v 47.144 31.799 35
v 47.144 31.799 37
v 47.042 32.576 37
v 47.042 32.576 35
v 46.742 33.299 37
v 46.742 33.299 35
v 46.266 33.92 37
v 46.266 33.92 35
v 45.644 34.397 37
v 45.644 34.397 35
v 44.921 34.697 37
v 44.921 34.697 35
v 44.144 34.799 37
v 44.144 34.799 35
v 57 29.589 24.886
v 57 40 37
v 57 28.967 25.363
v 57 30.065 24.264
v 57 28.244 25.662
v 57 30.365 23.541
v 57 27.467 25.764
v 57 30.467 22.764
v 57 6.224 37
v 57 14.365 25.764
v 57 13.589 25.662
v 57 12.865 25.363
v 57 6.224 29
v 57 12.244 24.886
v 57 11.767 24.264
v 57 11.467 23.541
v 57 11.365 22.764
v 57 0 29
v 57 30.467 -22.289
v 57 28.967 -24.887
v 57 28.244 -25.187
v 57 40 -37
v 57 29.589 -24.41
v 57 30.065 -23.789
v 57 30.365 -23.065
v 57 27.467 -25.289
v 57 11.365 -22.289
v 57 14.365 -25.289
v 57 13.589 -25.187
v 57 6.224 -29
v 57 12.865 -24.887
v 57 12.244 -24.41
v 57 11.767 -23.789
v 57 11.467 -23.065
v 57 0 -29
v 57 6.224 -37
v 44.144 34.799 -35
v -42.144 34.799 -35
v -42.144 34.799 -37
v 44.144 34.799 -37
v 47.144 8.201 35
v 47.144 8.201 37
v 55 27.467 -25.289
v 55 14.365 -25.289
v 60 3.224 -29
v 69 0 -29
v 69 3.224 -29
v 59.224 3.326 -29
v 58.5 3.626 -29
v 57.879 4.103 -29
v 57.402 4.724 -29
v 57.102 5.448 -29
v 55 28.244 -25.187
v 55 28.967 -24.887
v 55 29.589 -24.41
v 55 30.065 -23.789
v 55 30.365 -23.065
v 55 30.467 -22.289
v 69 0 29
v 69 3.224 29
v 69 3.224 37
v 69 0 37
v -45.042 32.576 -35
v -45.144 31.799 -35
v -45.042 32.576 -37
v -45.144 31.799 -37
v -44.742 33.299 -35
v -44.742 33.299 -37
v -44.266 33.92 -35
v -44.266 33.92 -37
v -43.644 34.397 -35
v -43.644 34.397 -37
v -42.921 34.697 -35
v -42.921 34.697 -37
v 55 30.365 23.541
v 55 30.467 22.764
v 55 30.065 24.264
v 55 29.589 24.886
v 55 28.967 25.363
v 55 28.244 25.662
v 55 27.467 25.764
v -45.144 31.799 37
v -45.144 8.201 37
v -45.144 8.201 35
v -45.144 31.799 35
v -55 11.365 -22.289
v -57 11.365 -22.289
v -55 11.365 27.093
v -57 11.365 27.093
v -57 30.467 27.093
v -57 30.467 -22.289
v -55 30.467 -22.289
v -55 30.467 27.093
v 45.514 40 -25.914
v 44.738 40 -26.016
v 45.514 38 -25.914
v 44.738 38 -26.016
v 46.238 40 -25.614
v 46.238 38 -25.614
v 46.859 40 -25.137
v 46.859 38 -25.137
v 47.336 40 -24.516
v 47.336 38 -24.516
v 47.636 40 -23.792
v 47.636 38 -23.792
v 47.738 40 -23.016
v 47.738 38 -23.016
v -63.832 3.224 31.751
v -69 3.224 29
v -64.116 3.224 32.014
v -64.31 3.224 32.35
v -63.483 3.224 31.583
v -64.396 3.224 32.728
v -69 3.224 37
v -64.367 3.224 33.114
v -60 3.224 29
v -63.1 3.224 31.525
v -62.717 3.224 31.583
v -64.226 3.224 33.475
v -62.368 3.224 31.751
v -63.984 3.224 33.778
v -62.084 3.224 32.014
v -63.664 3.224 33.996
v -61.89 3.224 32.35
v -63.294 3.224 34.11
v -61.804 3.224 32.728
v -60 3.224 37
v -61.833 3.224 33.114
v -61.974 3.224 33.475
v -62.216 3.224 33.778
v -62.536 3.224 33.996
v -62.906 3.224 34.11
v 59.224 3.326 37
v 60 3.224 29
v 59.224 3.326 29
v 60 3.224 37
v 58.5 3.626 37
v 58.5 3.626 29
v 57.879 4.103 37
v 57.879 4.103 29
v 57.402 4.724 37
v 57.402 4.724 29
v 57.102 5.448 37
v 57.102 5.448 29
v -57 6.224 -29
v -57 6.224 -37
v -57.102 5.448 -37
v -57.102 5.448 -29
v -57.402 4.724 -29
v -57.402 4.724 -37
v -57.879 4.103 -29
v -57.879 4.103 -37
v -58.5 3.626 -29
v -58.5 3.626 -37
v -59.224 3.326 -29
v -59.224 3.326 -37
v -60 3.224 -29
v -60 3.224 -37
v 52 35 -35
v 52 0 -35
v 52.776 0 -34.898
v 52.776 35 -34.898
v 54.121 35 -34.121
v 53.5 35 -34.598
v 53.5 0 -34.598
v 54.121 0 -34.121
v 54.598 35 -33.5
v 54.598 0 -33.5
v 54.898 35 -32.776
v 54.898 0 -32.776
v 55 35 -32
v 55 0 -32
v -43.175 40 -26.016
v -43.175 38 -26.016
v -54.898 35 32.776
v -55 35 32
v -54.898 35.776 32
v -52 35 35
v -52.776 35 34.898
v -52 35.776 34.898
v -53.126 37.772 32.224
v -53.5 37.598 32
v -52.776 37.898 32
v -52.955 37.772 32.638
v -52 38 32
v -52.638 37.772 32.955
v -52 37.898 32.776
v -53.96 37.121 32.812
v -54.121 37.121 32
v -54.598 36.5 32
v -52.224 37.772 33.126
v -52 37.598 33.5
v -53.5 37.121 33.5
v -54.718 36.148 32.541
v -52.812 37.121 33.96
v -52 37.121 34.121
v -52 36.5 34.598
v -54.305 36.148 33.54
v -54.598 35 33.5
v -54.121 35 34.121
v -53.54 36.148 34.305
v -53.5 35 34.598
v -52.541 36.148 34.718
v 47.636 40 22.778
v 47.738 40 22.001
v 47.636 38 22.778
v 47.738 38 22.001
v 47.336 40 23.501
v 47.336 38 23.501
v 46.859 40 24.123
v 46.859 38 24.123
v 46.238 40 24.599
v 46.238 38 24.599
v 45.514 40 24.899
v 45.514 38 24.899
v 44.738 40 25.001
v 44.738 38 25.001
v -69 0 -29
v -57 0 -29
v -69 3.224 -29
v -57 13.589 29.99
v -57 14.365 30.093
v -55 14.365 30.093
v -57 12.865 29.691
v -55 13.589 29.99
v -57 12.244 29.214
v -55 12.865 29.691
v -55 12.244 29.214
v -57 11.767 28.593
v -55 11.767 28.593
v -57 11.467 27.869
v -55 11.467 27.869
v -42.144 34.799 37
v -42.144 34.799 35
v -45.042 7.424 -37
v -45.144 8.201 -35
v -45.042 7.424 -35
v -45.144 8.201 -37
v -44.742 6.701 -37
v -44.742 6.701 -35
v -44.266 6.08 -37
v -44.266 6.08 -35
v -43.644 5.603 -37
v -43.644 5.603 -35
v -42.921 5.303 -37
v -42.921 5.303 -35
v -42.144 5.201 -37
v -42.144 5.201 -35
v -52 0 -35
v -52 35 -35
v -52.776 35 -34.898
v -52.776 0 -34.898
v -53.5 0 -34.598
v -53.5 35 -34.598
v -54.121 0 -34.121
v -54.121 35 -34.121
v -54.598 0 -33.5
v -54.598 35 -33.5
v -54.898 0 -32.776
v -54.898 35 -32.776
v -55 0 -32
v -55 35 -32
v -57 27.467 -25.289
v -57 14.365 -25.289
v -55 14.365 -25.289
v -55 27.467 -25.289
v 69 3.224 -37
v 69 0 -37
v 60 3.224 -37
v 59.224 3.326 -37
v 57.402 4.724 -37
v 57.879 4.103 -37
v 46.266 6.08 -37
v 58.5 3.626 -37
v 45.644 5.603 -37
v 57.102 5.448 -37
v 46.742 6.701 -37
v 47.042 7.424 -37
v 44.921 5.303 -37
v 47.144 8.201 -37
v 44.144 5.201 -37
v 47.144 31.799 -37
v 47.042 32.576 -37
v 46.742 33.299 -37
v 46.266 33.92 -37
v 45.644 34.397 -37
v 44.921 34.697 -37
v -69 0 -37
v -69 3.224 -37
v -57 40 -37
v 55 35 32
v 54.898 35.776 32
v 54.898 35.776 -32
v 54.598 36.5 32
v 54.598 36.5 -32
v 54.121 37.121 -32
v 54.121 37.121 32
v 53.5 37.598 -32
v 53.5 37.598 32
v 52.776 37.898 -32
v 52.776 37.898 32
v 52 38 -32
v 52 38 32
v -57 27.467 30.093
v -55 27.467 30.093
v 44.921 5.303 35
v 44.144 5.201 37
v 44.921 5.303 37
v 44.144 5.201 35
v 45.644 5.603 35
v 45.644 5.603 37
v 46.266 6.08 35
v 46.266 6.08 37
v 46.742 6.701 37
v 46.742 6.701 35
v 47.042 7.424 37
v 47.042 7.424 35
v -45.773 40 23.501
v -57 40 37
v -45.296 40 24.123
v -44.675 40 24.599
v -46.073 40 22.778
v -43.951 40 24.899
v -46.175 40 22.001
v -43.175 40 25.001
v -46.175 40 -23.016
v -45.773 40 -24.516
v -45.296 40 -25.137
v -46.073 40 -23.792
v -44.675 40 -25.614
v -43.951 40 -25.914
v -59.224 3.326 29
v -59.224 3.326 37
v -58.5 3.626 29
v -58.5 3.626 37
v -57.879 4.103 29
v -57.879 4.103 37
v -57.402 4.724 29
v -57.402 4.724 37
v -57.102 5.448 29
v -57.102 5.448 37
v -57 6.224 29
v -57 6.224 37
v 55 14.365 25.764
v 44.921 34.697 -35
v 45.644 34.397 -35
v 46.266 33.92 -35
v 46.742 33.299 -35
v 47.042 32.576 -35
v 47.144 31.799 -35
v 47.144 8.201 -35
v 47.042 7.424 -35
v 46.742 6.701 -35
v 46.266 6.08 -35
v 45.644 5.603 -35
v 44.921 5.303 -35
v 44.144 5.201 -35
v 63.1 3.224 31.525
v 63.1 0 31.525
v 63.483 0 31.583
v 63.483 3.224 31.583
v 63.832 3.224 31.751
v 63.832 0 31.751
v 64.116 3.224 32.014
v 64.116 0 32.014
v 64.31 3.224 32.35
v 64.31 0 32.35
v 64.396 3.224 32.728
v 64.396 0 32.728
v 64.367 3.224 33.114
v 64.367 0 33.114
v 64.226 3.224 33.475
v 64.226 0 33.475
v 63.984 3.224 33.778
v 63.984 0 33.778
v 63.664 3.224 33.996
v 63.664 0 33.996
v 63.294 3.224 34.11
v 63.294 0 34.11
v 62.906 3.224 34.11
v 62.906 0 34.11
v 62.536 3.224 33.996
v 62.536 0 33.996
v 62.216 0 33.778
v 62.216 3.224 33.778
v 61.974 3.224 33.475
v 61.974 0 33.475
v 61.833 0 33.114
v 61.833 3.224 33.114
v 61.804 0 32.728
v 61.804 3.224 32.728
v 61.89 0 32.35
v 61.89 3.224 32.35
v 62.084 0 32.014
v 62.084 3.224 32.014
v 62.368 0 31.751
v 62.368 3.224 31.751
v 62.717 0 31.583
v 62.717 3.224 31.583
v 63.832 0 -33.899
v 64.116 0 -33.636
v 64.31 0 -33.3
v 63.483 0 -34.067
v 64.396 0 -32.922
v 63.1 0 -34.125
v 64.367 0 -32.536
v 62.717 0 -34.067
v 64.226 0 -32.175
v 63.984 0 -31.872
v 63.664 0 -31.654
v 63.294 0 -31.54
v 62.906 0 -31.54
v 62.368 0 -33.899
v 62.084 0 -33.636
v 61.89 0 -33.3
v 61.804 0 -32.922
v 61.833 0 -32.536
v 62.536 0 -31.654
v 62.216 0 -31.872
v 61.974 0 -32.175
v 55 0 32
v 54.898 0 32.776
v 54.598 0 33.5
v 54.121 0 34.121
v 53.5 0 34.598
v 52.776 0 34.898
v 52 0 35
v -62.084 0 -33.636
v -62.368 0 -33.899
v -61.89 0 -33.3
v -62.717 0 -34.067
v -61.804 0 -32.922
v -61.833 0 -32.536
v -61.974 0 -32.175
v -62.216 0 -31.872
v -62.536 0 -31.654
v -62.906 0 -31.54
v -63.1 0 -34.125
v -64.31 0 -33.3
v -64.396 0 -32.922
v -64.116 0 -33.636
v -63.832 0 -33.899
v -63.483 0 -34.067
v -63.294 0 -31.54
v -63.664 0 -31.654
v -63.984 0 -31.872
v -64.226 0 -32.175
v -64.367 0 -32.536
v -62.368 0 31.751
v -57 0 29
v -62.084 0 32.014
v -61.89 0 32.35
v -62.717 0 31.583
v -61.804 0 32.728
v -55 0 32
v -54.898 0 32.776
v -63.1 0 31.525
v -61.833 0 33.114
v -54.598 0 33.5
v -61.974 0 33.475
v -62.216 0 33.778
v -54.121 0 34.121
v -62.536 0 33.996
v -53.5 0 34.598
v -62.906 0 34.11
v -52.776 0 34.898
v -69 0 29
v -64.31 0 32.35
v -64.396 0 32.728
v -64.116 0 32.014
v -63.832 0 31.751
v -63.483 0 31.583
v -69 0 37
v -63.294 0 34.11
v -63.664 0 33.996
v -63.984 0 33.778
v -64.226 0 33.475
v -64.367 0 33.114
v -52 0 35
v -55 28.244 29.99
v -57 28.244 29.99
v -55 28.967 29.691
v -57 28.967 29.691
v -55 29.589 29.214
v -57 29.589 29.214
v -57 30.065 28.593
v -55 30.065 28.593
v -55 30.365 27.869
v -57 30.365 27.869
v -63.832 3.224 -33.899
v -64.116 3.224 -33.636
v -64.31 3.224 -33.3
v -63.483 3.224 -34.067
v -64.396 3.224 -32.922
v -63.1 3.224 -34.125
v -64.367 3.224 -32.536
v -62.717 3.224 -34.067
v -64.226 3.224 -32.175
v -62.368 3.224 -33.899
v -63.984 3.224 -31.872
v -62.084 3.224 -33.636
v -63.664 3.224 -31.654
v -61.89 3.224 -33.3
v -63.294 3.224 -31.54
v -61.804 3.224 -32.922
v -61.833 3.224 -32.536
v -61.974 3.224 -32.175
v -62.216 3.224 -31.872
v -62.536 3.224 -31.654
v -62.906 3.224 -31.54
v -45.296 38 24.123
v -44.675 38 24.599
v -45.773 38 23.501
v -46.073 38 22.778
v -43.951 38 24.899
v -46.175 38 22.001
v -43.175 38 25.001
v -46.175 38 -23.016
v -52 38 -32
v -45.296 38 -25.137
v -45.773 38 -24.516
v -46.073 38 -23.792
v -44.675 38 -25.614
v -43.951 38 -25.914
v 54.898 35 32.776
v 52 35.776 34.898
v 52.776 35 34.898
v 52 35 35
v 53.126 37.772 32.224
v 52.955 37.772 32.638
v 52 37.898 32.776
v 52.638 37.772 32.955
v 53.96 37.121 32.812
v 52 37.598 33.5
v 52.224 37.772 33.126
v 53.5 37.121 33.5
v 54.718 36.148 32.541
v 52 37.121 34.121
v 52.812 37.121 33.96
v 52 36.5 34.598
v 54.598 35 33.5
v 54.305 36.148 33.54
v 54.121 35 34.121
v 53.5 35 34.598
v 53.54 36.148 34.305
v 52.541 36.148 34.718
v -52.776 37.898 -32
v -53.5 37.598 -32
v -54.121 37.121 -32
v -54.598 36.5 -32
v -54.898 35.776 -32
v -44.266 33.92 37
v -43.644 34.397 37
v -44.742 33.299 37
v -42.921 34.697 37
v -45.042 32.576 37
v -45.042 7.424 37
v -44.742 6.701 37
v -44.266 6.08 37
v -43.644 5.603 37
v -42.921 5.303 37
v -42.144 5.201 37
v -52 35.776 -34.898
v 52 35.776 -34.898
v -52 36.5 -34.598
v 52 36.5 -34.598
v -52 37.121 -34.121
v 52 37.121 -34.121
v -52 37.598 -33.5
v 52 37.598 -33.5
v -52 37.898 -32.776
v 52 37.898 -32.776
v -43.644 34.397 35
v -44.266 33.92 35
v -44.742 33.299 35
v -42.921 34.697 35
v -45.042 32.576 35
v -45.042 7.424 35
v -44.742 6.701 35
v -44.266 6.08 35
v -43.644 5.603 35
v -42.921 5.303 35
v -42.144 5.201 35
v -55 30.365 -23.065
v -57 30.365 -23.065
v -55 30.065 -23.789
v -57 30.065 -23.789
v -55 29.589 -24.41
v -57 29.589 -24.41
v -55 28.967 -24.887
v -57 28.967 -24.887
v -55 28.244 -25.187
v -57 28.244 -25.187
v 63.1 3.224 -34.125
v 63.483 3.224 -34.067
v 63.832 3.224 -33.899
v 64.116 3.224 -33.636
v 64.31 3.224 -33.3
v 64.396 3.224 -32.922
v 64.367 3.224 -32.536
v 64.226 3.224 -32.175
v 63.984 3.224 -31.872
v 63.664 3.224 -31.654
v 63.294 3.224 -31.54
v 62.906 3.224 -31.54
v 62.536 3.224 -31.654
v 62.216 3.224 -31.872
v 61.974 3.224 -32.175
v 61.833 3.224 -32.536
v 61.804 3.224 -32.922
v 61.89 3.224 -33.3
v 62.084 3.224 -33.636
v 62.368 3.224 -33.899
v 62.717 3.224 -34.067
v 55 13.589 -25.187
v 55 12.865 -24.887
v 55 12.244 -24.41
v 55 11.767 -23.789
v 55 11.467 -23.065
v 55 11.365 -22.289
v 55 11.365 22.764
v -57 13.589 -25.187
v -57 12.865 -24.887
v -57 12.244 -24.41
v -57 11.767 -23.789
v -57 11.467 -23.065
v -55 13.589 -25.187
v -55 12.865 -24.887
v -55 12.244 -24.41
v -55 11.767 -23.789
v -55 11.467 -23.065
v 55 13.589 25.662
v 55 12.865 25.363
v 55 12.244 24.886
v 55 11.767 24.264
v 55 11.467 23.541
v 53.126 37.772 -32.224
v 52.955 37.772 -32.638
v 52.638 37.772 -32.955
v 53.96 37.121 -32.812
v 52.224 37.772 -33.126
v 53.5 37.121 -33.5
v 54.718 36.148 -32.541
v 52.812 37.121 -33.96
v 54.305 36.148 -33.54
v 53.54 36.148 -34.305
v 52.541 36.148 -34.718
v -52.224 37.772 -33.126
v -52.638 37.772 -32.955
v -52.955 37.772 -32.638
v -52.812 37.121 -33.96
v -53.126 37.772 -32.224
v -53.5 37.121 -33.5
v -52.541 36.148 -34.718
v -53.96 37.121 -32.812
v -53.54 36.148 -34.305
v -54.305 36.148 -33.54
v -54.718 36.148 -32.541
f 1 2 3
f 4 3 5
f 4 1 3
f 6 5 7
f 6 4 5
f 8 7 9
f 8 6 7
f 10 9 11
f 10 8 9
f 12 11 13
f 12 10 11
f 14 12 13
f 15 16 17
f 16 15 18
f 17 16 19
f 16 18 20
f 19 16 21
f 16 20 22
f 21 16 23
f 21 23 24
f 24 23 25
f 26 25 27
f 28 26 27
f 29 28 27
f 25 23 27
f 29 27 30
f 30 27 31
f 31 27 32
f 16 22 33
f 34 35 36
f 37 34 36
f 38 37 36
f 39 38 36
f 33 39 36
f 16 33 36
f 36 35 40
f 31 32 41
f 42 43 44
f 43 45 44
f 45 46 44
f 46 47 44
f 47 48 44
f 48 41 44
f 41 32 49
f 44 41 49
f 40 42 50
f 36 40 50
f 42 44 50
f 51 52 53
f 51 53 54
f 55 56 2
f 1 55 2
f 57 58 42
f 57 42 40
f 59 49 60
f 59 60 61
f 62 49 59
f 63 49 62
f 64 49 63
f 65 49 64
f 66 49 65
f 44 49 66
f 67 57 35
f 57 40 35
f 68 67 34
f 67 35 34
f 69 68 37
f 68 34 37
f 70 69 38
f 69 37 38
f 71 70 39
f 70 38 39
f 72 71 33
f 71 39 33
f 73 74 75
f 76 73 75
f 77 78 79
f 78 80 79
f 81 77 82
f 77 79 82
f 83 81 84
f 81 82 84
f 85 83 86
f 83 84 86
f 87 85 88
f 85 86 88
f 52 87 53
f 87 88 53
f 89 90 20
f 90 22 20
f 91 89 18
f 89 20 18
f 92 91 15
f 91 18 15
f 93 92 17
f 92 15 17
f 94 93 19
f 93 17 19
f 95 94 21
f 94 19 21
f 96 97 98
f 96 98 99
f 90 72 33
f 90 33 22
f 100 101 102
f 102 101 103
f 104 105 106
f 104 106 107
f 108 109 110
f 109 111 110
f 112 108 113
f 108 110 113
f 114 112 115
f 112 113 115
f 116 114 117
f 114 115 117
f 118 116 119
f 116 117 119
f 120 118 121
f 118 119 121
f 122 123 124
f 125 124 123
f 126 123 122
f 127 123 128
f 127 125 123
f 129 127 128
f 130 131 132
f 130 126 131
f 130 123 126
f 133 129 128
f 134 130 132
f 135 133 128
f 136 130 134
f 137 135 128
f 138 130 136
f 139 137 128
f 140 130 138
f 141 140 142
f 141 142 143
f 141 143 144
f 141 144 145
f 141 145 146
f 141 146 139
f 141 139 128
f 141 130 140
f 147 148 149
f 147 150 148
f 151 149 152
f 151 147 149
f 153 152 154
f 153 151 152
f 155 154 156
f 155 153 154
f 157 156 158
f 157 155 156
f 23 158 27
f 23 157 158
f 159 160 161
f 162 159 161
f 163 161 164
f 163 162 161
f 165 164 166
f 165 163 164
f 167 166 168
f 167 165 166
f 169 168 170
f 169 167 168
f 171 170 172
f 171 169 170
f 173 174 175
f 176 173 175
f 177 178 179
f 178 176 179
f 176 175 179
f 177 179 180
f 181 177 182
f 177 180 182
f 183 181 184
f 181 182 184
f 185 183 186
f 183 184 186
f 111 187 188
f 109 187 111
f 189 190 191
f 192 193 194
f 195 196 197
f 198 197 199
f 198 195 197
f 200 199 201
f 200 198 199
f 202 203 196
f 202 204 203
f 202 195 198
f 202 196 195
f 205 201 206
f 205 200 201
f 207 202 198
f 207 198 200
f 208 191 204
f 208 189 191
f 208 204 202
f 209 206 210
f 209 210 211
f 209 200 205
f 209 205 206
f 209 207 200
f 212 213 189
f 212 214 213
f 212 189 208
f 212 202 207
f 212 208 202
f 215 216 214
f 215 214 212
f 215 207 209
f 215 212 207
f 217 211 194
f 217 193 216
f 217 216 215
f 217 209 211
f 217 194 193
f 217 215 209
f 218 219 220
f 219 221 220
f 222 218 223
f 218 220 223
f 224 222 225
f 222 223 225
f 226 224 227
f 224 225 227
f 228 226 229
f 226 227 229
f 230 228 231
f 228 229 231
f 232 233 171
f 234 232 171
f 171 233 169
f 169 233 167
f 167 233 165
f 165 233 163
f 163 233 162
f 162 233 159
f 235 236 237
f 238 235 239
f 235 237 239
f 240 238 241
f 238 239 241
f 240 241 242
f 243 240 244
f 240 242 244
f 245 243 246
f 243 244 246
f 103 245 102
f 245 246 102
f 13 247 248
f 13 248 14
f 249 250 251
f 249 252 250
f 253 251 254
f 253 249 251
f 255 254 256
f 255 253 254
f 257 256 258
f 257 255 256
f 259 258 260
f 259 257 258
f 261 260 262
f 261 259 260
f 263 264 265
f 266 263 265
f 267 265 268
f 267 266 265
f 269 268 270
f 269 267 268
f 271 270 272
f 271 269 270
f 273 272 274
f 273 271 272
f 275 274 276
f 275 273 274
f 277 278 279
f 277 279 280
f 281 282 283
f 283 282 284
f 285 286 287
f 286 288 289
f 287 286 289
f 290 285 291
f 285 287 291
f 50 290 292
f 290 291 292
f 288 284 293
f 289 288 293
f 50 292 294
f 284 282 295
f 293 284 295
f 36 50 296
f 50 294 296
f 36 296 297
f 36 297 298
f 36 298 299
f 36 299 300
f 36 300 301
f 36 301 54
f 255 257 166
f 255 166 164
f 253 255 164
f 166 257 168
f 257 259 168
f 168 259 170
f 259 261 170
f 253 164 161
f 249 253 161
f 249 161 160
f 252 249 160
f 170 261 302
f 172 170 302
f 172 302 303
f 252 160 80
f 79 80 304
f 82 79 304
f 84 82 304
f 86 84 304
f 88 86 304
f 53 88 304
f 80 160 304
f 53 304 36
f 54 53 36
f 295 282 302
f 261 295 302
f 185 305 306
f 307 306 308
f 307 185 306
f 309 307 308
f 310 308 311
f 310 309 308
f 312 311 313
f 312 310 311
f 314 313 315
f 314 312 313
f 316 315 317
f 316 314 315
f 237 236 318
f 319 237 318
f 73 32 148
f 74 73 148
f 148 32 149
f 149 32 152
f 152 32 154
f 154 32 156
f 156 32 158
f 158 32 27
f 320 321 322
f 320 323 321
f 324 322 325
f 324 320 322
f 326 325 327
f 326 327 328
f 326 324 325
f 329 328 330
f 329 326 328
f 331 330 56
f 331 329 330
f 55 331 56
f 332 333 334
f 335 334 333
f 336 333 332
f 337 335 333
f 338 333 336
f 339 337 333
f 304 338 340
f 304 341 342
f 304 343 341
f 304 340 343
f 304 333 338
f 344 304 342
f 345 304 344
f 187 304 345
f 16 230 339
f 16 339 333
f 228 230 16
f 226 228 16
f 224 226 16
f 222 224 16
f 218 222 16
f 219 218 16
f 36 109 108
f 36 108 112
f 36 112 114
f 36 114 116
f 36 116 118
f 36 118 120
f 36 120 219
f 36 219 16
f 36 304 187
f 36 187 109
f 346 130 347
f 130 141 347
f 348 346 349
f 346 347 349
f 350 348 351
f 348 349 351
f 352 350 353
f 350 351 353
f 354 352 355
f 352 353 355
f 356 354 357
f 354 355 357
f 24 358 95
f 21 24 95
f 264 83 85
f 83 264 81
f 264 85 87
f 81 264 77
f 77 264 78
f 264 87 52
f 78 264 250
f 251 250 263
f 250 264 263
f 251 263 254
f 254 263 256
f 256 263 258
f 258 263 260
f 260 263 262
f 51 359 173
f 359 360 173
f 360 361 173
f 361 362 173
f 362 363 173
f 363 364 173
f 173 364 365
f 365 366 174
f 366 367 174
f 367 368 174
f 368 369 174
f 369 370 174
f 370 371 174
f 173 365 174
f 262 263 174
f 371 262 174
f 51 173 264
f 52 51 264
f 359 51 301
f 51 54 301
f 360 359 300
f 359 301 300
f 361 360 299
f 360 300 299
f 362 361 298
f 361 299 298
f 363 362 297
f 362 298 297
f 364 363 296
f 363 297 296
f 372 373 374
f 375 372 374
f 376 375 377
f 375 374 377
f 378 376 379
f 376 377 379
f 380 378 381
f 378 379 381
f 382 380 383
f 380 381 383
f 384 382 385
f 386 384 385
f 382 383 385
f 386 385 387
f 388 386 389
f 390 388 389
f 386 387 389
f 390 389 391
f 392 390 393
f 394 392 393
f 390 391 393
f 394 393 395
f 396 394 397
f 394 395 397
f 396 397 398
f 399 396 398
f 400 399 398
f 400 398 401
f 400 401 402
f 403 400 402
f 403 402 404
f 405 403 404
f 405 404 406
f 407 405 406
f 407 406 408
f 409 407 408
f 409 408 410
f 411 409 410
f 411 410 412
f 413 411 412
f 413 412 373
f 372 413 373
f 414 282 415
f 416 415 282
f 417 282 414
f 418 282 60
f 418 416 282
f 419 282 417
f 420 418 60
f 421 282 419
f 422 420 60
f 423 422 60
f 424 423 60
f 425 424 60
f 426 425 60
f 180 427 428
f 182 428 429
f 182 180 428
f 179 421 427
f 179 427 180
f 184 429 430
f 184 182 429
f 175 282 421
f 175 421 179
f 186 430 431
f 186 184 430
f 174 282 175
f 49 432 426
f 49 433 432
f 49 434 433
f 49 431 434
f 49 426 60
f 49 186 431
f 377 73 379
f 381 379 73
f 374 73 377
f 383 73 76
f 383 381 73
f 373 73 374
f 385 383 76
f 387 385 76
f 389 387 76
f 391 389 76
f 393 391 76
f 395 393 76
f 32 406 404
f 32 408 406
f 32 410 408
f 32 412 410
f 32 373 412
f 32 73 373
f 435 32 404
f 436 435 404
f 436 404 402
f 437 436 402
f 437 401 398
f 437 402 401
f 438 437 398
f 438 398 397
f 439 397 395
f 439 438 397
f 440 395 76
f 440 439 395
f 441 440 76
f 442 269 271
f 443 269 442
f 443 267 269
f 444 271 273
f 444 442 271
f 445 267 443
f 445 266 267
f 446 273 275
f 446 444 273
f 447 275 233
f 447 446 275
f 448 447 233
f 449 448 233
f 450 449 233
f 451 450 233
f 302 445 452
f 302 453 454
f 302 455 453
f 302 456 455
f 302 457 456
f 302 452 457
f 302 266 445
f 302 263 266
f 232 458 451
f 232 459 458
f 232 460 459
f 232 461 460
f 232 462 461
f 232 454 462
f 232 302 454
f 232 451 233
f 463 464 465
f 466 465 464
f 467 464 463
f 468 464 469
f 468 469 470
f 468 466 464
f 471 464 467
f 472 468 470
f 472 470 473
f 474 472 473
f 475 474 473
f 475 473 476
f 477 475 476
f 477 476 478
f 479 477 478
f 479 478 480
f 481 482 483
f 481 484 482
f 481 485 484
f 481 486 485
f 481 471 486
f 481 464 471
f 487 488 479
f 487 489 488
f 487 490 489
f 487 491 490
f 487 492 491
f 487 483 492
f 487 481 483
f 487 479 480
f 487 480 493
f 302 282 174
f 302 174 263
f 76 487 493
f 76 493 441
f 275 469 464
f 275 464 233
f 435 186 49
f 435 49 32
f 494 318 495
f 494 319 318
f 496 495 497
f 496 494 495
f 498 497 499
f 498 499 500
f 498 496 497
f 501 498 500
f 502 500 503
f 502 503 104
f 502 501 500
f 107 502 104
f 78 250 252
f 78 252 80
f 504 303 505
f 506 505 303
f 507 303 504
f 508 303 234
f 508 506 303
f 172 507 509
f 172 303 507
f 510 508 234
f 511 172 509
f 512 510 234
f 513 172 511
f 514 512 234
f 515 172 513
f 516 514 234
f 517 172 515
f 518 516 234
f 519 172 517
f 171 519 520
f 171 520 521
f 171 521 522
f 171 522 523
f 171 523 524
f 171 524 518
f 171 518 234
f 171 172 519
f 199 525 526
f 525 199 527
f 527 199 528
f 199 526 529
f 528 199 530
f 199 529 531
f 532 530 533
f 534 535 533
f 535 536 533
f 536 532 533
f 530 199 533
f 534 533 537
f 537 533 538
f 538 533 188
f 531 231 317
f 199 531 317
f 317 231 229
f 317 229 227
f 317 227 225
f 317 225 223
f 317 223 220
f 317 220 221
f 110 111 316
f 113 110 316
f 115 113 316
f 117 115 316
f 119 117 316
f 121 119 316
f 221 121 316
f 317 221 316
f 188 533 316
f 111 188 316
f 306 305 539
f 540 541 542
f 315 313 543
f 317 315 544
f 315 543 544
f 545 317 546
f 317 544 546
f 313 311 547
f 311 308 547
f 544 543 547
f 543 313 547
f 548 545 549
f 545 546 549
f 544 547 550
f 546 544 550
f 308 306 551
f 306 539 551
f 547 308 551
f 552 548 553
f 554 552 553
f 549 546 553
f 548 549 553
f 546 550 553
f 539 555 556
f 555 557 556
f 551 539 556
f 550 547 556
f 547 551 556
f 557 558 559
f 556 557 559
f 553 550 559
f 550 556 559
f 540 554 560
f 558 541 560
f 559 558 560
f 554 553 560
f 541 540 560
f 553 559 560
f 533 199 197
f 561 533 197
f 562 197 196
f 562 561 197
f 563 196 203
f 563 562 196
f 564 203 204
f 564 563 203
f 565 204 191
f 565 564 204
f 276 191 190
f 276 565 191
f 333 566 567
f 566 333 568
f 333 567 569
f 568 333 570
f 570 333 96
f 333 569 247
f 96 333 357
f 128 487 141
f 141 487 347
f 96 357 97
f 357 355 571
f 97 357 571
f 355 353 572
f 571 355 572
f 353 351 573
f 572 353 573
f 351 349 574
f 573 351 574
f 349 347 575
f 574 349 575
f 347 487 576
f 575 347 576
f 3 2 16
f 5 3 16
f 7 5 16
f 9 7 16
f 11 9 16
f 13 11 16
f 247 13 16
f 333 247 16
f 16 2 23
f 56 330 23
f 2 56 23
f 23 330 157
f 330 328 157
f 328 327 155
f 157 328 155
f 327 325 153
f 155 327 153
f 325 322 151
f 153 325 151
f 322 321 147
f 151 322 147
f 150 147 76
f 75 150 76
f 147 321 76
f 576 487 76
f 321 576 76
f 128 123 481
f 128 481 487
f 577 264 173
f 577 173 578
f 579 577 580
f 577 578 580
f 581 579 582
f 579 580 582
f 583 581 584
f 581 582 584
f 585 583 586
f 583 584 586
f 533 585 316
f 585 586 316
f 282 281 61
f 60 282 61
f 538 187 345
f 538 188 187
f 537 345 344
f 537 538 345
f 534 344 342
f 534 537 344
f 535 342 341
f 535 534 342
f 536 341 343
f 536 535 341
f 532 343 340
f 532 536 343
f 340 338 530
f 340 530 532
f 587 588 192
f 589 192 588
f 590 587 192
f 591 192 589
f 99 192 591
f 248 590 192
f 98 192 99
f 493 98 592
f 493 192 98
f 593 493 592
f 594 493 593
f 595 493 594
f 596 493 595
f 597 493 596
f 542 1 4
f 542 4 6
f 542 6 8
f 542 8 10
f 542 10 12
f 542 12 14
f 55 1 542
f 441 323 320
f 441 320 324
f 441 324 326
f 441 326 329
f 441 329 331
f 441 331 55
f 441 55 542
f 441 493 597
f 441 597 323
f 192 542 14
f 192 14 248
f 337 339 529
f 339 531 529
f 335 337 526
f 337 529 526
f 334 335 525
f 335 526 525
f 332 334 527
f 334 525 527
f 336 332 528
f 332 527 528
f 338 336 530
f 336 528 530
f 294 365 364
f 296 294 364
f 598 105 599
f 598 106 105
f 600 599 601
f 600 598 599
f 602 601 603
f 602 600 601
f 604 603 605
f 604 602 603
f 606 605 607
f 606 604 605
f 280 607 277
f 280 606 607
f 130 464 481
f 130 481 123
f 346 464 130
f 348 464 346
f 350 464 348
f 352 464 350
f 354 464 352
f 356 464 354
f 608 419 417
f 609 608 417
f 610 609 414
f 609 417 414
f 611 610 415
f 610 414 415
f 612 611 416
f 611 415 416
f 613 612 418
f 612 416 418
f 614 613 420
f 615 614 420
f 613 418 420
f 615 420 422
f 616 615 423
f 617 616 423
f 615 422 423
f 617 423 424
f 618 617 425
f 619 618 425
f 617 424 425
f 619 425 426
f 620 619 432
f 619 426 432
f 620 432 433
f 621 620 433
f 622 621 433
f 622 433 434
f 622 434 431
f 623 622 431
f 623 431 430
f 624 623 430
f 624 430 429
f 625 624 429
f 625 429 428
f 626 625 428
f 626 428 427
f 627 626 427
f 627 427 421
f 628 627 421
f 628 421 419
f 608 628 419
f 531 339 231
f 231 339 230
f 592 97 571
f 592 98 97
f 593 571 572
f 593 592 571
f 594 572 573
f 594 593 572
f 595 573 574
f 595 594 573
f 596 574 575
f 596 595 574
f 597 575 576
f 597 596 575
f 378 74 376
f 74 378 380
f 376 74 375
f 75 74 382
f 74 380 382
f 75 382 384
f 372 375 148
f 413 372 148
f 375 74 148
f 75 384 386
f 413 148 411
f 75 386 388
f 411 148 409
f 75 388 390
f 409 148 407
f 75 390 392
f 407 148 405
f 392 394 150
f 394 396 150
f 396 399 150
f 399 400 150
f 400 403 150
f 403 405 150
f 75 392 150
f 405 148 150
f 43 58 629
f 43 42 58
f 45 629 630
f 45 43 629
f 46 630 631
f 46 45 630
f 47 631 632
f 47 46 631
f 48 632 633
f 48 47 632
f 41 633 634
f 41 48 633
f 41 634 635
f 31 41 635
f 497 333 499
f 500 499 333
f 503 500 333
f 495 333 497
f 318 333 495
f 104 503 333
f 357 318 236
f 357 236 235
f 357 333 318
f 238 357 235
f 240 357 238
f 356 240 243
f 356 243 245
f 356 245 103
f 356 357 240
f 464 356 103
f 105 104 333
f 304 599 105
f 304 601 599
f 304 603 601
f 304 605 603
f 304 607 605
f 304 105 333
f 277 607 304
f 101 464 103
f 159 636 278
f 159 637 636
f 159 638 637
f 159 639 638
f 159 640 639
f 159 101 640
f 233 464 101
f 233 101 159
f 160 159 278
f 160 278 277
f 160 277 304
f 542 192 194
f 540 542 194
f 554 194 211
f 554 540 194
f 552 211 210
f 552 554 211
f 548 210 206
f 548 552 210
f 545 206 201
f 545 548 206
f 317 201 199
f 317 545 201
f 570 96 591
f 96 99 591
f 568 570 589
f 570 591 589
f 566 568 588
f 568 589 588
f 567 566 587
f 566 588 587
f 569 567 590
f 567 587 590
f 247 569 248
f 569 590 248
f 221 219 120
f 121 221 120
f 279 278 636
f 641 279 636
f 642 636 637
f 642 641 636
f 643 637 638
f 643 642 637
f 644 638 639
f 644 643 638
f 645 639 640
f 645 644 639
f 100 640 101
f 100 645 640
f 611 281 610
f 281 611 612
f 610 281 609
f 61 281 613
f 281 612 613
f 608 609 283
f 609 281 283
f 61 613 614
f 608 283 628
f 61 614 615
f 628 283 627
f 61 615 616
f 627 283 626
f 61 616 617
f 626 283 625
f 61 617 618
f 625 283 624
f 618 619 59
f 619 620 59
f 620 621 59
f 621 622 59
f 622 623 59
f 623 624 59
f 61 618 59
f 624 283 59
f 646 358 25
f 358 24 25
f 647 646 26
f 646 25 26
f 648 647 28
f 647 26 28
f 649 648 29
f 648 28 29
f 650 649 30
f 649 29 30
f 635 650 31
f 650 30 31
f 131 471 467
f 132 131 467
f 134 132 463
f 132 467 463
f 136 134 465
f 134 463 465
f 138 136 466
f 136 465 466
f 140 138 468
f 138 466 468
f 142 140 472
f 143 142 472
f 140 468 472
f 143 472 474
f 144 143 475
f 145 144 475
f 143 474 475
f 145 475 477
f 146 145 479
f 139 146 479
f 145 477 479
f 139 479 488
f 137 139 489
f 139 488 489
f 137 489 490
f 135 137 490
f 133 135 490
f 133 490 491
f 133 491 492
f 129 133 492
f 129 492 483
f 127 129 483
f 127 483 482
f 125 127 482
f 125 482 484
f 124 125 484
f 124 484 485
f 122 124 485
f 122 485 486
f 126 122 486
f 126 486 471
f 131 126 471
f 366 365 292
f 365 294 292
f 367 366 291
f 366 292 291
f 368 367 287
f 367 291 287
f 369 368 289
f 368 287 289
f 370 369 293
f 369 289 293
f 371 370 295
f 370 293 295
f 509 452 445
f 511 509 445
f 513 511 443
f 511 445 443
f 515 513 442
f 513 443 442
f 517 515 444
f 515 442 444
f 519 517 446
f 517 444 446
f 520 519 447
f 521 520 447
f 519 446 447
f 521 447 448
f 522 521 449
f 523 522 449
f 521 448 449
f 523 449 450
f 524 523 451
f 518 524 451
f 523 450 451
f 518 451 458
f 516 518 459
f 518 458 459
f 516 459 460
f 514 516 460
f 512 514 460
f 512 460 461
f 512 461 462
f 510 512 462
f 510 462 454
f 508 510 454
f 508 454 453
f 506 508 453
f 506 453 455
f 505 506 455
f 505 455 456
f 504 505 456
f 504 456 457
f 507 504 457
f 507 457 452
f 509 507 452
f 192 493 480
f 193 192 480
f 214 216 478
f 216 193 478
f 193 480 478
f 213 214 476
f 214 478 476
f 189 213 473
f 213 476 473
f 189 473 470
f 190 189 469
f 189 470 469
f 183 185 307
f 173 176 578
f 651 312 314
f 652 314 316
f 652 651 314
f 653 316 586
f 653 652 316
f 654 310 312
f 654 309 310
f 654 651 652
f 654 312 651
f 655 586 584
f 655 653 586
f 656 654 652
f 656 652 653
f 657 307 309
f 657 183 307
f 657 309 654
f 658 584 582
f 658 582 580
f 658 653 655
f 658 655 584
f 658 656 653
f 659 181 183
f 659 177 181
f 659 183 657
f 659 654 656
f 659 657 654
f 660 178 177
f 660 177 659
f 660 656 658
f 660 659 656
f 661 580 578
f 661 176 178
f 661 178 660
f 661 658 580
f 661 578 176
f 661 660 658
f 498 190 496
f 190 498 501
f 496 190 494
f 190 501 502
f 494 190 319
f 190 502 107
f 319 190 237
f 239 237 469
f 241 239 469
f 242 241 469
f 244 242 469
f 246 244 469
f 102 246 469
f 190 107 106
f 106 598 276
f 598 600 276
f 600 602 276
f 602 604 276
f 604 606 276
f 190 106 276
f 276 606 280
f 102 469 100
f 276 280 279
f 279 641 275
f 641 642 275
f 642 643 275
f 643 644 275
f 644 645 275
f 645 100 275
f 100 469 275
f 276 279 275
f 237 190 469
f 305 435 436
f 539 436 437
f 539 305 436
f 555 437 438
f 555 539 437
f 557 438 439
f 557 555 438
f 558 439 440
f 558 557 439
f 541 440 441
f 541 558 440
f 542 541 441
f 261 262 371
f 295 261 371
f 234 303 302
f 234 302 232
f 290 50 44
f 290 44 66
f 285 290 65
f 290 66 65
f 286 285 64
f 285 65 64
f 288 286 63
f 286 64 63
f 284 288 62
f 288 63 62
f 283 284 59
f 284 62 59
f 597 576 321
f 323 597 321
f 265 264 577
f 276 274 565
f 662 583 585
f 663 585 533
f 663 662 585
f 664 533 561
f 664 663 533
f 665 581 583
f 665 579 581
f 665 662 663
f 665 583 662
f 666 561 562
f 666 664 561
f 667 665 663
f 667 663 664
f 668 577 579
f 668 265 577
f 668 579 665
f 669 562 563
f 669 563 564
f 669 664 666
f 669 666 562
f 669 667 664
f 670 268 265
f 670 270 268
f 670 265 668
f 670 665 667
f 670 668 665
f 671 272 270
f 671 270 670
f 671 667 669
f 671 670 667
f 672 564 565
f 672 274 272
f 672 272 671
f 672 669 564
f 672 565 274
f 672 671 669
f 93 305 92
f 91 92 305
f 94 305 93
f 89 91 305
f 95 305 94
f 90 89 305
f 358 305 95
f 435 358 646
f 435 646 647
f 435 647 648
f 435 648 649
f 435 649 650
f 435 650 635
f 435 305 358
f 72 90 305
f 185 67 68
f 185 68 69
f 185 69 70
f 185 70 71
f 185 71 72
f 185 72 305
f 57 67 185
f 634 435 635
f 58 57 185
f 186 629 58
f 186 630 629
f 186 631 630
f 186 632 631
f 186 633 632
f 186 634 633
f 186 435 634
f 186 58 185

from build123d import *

# Parameters (mm, degrees)
SKETCH1_W           = 114
SKETCH1_H           = 74
BOSS_EXTRUDE1_DEPTH = 40
SHELL1_T            = -2
SKETCH2_W           = 8
SKETCH2_H           = 3.224245312
BOSS_EXTRUDE2_DEPTH = 12
CUT_EXTRUDE1_REACH  = 89.92
SKETCH3_W           = 93.912635184
SKETCH3_H           = 51.017060478
SKETCH4_W           = 51.053224202
SKETCH4_H           = 19.102136622
CUT_EXTRUDE2_DEPTH  = 138.277092044
SKETCH5_W           = 92.288442818
SKETCH5_H           = 29.598231076
CUT_EXTRUDE3_DEPTH  = 109.797977922
SKETCH6_W           = 4.328253691
SKETCH6_H           = 19.102136622
CUT_EXTRUDE4_DEPTH  = 12
FILLET1_R           = 3
SKETCH7_R           = 1.3
CUT_EXTRUDE5_DEPTH  = 12


with BuildPart() as part:
    # Sketch1 → Boss-Extrude1 (new body)
    with BuildSketch(Plane(origin=(0, 0, 0), x_dir=(1, 0, 0), z_dir=(0, 1, 0))):
        Rectangle(SKETCH1_W, SKETCH1_H)
    extrude(amount=BOSS_EXTRUDE1_DEPTH)

    # Shell1
    shell1_openings = [part.faces().sort_by_distance(p)[0] for p in [
        (0, 0, 0),
    ]]
    offset(amount=SHELL1_T, openings=shell1_openings, kind=Kind.INTERSECTION)

    # Sketch2 → Boss-Extrude2 (add)
    with BuildSketch(Plane.ZY.offset(57)):
        with Locations((-33, 1.612122656)):
            Rectangle(SKETCH2_W, SKETCH2_H)
        with Locations((33, 1.612122656)):
            Rectangle(SKETCH2_W, SKETCH2_H)
    boss_extrude2 = extrude(amount=BOSS_EXTRUDE2_DEPTH)

    # Mirror1: Boss-Extrude2 across plane
    add(boss_extrude2.mirror(Plane.ZY))

    # Sketch3 → Cut-Extrude1 (cut, up to next)
    with BuildSketch(Plane(origin=(0, 40, 0), x_dir=(1, 0, 0), z_dir=(0, 1, 0)), mode=Mode.PRIVATE) as cut_extrude1_sk1:
        with Locations((0.781529231, 0.507308448)):
            Rectangle(SKETCH3_W, SKETCH3_H)
    cut_extrude1_tool1 = extrude(cut_extrude1_sk1.sketch, amount=-CUT_EXTRUDE1_REACH, mode=Mode.PRIVATE) & part.part
    add(cut_extrude1_tool1.solids().sort_by_distance((0.781529, 40, -0.507308))[0], mode=Mode.SUBTRACT)

    # Sketch4 → Cut-Extrude2 (cut, through all)
    with BuildSketch(Plane.ZY.offset(57)):
        with Locations((0.2378186, 20.916211941)):
            Rectangle(SKETCH4_W, SKETCH4_H)
    extrude(amount=-CUT_EXTRUDE2_DEPTH, mode=Mode.SUBTRACT)

    # Sketch5 → Cut-Extrude3 (cut, through all)
    with BuildSketch(Plane.XY.offset(37)):
        with Locations((1, 20)):
            Rectangle(SKETCH5_W, SKETCH5_H)
    extrude(amount=-CUT_EXTRUDE3_DEPTH, mode=Mode.SUBTRACT)

    # Sketch6 → Cut-Extrude4 (cut)
    with BuildSketch(Plane.ZY.offset(57)):
        with Locations((27.928557547, 20.916211941)):
            Rectangle(SKETCH6_W, SKETCH6_H)
    extrude(amount=-CUT_EXTRUDE4_DEPTH, mode=Mode.SUBTRACT)

    # Fillet1
    fillet1_edges = [part.edges().sort_by_distance(p)[0] for p in [
        (47.144221409, 34.799115538, -36),
        (47.144221409, 5.200884462, -36),
        (-45.144221409, 5.200884462, -36),
        (-45.144221409, 34.799115538, -36),
        (47.144221409, 34.799115538, 36),
        (47.144221409, 5.200884462, 36),
        (-45.144221409, 5.200884462, 36),
        (-45.144221409, 34.799115538, 36),
        (-56, 30.467280252, 30.092684392),
        (-56, 11.36514363, 30.092684392),
        (55, 19, 35),
        (55, 19, -35),
        (-55, 19, -35),
        (-55, 19, 35),
        (55, 38, 0),
        (0, 38, -35),
        (-55, 38, 0),
        (0, 38, 35),
        (-57, 3.224245312, -33),
        (-57, 3.224245312, 33),
        (57, 3.224245312, -33),
        (57, 3.224245312, 33),
        (-46.174788361, 39, 25.001221791),
        (-46.174788361, 39, -26.015838687),
        (47.737846823, 39, -26.015838687),
        (47.737846823, 39, 25.001221791),
        (56, 30.467280252, 25.764430701),
        (56, 11.36514363, 25.764430701),
        (56, 11.36514363, -25.288793501),
        (56, 30.467280252, -25.288793501),
        (-56, 11.36514363, -25.288793501),
        (-56, 30.467280252, -25.288793501),
    ]]
    fillet(fillet1_edges, radius=FILLET1_R)

    # Sketch7 → Cut-Extrude5 (cut)
    with BuildSketch(Plane.XZ):
        with Locations(Location((-63.1, -32.825, 0), (0, 0, 270))):
            Circle(SKETCH7_R)
        with Locations(Location((-63.1, 32.825, 0), (0, 0, 270))):
            Circle(SKETCH7_R)
        with Locations(Location((63.1, 32.825, 0), (0, 0, 270))):
            Circle(SKETCH7_R)
        with Locations(Location((63.1, -32.825, 0), (0, 0, 270))):
            Circle(SKETCH7_R)
    extrude(amount=-CUT_EXTRUDE5_DEPTH, mode=Mode.SUBTRACT)


solid = part.part
